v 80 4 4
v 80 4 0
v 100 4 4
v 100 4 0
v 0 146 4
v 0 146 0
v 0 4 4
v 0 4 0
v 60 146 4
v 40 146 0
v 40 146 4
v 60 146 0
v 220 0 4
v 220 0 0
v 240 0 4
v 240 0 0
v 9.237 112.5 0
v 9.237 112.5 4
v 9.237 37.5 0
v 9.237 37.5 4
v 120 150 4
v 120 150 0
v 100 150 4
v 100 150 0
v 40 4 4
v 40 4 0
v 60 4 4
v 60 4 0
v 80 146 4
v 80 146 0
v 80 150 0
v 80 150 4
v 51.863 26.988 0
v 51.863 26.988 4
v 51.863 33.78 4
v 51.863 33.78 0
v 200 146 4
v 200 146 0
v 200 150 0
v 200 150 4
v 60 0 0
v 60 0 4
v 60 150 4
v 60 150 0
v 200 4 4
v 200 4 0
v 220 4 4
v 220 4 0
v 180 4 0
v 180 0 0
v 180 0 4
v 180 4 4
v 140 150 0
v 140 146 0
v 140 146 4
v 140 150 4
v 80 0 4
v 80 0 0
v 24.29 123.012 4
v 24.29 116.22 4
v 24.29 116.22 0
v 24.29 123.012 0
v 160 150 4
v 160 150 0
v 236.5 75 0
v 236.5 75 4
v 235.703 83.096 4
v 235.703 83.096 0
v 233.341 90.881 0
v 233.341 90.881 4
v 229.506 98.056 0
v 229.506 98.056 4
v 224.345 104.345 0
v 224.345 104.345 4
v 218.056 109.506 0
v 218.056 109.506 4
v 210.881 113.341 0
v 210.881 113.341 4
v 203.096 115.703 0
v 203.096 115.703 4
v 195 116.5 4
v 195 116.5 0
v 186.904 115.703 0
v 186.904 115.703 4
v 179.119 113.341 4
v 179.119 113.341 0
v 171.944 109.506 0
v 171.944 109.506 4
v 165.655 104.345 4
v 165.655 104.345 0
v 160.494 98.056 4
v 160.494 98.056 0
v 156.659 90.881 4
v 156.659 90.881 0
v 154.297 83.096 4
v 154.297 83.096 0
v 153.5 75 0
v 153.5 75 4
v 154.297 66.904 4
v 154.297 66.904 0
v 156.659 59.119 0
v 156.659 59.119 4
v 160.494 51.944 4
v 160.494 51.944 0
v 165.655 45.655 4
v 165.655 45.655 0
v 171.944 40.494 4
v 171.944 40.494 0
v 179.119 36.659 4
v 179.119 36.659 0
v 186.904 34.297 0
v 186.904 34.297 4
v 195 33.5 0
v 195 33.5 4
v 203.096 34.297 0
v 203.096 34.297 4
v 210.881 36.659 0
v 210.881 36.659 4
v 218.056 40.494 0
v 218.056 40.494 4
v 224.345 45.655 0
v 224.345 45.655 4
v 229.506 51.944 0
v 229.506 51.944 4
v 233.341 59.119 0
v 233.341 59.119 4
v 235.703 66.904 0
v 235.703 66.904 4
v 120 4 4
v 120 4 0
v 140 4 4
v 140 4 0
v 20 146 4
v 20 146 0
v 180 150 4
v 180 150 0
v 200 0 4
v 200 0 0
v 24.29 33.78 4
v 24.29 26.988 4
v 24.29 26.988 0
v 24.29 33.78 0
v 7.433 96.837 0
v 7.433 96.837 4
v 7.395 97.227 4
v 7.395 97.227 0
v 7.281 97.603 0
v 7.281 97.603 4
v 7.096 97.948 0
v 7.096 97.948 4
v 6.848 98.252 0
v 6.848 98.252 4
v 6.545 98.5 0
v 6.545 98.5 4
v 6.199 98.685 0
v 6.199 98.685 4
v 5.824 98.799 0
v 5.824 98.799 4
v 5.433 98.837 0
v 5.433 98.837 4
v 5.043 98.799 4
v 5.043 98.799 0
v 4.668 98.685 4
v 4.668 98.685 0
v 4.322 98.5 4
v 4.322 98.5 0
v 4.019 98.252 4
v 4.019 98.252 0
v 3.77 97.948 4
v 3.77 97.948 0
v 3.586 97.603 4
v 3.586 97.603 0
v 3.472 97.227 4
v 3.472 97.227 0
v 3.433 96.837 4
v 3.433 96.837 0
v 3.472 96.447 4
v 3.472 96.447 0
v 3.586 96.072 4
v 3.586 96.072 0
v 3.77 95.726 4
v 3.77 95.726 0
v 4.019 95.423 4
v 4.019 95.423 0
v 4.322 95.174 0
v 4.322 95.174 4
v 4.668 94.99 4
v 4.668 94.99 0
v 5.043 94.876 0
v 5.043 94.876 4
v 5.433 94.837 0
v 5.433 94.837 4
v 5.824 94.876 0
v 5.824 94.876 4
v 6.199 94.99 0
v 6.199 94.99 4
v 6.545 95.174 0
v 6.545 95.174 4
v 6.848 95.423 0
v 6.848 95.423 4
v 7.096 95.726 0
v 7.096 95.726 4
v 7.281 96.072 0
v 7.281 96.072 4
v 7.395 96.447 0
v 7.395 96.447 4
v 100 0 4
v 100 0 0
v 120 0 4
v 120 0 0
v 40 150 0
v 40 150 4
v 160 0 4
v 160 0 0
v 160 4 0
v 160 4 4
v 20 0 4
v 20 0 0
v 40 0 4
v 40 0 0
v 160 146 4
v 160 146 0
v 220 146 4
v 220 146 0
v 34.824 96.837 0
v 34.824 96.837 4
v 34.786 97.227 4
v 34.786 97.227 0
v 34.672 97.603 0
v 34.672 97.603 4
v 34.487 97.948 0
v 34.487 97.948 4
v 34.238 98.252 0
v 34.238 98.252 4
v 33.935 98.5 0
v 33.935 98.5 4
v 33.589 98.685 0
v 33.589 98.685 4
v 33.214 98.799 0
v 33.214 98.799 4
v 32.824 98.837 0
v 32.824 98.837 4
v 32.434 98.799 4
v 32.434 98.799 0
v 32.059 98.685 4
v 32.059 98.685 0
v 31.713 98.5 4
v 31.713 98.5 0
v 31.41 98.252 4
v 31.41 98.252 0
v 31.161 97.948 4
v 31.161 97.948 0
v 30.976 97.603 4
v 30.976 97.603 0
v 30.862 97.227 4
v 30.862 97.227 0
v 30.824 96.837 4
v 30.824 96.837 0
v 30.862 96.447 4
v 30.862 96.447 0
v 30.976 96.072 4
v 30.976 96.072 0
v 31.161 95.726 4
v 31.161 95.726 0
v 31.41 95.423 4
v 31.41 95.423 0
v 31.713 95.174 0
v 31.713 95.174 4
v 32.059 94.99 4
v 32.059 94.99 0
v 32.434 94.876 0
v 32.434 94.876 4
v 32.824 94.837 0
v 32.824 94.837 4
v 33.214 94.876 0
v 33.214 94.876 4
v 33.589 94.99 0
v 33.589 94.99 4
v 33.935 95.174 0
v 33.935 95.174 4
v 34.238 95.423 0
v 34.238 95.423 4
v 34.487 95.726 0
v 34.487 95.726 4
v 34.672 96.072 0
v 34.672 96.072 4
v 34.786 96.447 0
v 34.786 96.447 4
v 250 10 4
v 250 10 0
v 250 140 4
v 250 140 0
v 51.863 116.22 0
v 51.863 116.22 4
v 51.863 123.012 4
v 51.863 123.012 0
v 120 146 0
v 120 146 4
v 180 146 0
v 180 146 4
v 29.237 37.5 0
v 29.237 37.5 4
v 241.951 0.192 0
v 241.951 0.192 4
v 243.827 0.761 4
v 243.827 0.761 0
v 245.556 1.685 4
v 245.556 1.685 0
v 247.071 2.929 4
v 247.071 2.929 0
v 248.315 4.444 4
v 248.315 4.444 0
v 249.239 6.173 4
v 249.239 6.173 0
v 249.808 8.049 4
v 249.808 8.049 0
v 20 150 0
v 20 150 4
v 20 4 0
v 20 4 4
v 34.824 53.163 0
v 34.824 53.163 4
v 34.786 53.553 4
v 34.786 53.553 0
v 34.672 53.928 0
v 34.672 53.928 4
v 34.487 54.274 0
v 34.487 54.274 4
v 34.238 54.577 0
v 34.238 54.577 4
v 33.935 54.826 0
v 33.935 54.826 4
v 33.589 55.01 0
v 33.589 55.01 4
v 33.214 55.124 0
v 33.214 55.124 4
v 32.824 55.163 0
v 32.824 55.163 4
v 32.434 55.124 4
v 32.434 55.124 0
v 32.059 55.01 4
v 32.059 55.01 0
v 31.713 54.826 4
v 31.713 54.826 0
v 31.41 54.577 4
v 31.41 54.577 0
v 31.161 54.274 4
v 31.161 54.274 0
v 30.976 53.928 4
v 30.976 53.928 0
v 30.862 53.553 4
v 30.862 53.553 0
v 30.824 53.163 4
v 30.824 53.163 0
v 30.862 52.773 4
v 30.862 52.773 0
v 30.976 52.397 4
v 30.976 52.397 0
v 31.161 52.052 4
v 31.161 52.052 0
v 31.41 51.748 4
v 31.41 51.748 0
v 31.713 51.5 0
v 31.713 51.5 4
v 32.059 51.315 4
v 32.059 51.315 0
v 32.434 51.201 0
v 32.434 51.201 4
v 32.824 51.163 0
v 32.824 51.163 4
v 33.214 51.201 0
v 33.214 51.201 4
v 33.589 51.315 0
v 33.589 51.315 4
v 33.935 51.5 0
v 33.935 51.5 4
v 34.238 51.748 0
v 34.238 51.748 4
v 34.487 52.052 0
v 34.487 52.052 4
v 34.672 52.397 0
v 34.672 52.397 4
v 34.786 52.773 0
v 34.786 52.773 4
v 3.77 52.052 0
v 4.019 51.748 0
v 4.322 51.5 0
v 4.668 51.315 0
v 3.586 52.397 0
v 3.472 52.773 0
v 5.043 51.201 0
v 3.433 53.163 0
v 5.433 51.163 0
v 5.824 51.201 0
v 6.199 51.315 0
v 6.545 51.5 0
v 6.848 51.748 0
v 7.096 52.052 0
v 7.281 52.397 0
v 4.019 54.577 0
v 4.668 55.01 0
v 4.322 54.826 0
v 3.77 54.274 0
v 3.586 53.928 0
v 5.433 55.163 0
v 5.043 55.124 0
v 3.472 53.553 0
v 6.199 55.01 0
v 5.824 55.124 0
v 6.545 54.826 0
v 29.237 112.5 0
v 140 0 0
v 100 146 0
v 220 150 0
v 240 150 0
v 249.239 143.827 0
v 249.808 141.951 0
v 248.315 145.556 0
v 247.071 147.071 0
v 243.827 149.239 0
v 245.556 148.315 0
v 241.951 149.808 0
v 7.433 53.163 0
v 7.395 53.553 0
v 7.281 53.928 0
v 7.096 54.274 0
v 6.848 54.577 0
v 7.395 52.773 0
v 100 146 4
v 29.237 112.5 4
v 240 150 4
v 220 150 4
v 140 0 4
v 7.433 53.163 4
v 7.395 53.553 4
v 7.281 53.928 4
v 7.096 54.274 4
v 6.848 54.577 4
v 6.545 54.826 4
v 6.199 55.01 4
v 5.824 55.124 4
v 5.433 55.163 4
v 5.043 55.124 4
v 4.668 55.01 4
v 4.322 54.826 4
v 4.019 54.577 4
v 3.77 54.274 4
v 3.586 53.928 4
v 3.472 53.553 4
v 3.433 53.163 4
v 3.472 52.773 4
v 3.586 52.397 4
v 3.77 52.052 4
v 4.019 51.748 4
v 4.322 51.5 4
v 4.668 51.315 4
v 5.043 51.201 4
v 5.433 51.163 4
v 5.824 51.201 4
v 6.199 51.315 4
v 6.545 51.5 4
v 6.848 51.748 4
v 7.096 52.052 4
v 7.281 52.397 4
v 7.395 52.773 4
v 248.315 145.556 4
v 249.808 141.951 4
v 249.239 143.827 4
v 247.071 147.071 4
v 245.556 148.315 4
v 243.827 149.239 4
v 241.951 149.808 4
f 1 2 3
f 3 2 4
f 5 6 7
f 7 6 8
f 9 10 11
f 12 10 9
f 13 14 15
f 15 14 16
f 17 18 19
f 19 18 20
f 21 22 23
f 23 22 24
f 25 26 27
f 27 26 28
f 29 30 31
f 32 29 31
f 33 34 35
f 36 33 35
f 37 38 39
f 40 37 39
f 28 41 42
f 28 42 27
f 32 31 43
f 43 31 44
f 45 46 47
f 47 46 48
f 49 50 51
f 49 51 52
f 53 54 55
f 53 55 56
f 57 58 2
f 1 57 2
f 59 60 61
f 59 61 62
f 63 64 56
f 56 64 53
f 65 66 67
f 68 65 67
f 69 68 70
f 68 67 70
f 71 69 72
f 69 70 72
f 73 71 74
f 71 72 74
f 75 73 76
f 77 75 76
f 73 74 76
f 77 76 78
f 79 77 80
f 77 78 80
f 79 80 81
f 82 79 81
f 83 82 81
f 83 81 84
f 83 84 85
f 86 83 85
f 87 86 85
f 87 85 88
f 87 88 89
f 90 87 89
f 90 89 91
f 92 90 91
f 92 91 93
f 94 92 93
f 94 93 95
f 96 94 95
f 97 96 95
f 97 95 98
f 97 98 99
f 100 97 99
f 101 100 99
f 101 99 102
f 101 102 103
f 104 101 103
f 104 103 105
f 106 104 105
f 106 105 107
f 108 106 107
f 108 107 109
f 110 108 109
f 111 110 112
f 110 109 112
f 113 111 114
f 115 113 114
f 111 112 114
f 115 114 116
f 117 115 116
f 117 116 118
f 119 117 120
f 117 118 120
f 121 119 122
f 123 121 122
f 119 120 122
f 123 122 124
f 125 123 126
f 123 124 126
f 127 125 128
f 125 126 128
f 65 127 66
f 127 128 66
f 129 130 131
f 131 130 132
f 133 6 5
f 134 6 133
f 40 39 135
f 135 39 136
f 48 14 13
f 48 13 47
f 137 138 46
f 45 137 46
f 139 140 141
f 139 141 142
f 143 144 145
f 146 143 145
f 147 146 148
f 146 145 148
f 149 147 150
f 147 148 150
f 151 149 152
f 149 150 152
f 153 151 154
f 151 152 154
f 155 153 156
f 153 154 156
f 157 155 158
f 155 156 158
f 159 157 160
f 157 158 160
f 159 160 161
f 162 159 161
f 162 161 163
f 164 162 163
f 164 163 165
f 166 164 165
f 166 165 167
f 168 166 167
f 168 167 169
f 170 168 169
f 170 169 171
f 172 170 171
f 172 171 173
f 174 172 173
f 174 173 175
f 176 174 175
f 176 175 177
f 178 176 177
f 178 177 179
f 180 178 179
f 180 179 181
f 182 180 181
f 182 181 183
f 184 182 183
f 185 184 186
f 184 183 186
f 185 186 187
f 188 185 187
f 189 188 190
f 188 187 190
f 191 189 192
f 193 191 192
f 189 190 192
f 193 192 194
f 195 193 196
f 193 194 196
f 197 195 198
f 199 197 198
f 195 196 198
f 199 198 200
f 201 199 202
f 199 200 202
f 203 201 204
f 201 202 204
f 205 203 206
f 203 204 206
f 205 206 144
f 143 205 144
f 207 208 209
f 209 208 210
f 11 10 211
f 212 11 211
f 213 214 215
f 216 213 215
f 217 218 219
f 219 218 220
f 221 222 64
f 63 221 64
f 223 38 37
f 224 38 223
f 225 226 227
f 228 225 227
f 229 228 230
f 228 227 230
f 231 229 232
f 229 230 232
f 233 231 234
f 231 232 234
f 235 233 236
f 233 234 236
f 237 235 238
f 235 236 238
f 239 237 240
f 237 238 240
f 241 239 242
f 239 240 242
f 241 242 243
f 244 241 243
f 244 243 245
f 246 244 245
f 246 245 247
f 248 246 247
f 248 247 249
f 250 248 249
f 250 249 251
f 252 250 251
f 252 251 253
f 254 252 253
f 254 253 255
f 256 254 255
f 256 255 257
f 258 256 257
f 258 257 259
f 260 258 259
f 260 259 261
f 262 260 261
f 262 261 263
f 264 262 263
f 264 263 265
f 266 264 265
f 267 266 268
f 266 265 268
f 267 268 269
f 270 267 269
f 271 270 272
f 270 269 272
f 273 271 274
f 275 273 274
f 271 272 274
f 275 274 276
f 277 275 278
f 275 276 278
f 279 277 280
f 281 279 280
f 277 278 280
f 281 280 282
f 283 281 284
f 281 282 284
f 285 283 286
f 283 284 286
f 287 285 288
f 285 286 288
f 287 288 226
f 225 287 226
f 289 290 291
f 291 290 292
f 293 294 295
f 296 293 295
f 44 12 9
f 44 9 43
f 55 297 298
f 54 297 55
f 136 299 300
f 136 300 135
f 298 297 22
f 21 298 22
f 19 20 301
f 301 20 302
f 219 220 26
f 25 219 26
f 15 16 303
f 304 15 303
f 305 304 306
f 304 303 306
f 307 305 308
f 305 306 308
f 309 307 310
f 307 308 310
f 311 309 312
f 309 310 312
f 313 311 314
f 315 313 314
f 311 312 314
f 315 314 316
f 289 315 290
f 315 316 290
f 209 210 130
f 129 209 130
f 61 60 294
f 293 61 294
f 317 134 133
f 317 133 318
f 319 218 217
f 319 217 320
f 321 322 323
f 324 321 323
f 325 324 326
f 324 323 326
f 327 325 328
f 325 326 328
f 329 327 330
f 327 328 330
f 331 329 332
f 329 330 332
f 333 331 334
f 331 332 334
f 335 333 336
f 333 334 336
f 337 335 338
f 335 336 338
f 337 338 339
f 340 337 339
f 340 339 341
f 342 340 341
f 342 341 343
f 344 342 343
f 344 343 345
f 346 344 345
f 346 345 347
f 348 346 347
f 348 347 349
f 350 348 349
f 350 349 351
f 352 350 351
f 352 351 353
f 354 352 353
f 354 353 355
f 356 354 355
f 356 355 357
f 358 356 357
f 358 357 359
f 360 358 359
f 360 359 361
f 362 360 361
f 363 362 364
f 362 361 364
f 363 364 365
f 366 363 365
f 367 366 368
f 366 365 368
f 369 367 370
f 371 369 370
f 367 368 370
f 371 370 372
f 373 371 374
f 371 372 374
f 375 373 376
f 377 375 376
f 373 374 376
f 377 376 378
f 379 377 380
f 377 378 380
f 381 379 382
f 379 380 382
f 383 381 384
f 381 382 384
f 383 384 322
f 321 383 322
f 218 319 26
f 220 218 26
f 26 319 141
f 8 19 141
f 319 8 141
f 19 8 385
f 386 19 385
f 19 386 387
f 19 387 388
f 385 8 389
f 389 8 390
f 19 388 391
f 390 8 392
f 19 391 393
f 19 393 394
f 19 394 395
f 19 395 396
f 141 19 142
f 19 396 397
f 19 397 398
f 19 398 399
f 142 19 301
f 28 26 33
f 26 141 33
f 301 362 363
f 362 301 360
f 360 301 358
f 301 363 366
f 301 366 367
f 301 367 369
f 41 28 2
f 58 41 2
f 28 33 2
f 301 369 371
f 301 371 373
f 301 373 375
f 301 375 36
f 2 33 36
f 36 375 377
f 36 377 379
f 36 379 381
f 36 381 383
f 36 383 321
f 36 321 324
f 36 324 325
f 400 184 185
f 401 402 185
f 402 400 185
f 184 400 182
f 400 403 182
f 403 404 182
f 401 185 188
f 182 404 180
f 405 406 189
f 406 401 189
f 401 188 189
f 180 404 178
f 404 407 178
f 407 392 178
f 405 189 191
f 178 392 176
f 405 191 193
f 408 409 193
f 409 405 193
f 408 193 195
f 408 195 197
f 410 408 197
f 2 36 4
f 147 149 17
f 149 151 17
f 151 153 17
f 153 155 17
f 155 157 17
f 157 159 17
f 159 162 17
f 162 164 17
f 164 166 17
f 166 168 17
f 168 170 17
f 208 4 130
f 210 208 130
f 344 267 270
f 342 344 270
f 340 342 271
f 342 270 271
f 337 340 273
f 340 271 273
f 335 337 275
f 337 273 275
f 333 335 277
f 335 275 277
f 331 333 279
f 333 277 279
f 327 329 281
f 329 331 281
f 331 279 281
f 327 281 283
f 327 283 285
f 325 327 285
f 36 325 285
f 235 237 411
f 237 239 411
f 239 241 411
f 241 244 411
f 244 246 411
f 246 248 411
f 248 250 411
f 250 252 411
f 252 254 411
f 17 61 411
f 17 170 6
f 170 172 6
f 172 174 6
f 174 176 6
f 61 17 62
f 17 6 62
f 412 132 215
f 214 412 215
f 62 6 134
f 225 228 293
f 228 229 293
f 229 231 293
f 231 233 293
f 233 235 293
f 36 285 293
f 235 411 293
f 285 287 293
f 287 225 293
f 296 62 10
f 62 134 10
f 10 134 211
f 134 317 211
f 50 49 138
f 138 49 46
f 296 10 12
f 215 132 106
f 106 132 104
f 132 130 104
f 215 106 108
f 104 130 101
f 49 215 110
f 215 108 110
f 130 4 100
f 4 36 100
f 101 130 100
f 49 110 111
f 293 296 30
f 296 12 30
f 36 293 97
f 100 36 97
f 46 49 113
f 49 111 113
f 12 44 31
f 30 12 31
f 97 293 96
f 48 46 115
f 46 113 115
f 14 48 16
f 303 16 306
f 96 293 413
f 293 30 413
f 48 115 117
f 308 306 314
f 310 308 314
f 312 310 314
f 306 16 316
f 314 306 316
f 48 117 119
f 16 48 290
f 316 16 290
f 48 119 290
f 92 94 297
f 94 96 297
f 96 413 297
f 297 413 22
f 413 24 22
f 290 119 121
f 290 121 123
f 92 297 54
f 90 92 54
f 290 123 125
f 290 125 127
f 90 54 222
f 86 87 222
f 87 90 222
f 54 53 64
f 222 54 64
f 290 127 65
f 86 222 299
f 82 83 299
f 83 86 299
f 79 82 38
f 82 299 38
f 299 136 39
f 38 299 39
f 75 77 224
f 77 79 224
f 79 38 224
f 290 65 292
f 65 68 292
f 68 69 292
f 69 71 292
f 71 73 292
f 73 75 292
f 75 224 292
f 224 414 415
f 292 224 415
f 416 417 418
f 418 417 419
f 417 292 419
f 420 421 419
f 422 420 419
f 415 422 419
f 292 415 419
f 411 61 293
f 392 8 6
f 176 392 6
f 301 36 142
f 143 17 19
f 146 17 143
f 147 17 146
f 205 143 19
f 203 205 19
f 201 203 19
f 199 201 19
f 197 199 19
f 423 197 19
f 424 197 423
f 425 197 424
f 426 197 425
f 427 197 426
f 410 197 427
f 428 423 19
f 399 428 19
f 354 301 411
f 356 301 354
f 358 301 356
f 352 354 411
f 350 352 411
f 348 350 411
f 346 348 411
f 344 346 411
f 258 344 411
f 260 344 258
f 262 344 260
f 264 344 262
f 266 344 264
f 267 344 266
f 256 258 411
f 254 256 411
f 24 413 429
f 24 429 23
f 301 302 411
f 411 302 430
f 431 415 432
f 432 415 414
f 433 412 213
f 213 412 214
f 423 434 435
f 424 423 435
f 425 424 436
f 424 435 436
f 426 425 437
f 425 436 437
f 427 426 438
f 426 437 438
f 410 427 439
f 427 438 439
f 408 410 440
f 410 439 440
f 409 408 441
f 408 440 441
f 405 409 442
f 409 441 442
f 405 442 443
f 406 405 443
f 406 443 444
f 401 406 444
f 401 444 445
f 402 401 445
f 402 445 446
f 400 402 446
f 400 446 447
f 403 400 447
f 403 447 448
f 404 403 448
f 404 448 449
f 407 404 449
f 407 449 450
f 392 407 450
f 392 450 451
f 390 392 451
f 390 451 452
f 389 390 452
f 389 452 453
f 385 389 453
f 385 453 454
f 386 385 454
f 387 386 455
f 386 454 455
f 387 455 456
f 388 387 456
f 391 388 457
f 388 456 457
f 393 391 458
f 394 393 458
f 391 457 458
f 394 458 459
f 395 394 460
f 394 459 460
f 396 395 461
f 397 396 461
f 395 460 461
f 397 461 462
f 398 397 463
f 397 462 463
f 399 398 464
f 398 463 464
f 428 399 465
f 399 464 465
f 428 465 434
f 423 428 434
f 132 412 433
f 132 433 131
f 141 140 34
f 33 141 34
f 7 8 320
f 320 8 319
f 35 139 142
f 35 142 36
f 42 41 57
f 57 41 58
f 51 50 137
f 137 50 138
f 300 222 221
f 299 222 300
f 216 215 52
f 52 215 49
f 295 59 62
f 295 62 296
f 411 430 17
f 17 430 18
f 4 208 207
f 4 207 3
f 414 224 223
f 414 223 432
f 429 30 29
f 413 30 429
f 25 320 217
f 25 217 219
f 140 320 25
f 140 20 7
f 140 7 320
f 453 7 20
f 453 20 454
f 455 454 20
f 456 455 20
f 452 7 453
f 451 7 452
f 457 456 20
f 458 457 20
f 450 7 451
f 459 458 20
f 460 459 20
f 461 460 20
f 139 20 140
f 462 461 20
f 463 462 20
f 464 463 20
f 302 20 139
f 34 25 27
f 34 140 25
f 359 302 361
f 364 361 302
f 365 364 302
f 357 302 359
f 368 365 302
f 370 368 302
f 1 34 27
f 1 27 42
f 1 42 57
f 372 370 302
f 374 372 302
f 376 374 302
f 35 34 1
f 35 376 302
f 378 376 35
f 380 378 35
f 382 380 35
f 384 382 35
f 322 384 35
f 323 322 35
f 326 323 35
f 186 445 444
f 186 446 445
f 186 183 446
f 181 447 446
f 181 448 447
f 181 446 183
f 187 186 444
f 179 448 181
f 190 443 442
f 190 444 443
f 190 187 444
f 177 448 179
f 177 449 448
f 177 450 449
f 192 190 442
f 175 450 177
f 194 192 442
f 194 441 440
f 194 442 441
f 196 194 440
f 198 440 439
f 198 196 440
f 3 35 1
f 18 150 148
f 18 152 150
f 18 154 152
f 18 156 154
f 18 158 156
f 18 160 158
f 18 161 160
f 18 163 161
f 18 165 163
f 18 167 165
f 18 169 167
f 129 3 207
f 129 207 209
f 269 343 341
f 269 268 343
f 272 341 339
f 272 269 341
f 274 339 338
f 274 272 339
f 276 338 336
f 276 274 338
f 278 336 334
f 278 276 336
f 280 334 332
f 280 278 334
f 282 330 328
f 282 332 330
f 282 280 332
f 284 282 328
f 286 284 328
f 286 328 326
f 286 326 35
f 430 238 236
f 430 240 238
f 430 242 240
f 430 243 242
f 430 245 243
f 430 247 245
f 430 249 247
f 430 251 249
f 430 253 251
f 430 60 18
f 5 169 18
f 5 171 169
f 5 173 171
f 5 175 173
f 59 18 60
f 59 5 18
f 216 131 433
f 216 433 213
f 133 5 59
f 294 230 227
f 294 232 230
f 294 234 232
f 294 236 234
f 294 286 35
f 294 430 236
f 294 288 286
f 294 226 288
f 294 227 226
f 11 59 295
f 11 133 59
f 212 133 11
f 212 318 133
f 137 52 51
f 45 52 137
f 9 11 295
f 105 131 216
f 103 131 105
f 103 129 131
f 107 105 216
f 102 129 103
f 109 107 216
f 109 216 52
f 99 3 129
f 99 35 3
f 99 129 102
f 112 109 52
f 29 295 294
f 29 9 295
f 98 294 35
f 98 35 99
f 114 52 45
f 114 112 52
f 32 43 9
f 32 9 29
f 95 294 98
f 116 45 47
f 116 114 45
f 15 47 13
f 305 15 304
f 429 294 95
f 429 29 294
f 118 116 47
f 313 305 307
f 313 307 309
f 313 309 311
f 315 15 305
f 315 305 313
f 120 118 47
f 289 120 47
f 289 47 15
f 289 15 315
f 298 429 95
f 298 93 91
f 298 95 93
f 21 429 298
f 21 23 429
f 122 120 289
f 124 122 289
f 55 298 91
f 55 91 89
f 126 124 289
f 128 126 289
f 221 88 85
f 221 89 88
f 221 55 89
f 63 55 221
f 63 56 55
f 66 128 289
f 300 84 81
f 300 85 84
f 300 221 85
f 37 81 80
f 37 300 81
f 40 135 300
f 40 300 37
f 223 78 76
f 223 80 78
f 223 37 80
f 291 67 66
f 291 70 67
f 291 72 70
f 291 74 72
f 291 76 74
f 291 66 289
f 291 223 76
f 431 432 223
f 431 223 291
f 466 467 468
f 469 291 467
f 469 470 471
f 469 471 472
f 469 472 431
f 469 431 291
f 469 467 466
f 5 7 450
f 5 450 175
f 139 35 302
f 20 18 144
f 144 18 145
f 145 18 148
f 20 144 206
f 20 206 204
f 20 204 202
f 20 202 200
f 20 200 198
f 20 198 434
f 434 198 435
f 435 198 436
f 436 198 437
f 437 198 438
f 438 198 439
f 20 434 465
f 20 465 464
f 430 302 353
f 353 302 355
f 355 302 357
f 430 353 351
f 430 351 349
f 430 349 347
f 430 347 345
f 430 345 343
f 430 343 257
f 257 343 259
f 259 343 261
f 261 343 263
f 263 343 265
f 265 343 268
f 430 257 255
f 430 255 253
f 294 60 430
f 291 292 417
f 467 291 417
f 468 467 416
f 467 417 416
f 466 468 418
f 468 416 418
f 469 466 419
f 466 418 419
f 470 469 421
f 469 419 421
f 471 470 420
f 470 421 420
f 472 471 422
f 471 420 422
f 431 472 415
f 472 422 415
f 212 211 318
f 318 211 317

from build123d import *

# Parameters (mm, degrees)
PAD001_DEPTH    = 4
SKETCH_R        = 41.5
SKETCH_R_2      = 2
SKETCH_W        = 27.573456
SKETCH_H        = 6.791874
POCKET_DEPTH    = 5
SKETCH002_W     = 20
SKETCH002_H     = 4
POCKET001_DEPTH = 5


with BuildPart() as part:
    # Sketch001 → Pad001 (new body)
    with BuildSketch(Plane.XY):
        with BuildLine():
            Line((0, 0), (240, 0))
            ThreePointArc((240, 0), (247.071068, 2.928932), (250, 10))
            Line((250, 10), (250, 140))
            ThreePointArc((250, 140), (247.071068, 147.071068), (240, 150))
            Line((240, 150), (0, 150))
            Line((0, 150), (0, 0))
        make_face()
    extrude(amount=PAD001_DEPTH)

    # Sketch (on Face8 of Pad001) → Pocket (cut)
    with BuildSketch(Plane.XY.offset(4)):
        with Locations((195, 75)):
            Circle(SKETCH_R)
        with Locations((5.433387, 53.162704)):
            Circle(SKETCH_R_2)
        with Locations((32.82399, 96.837296)):
            Circle(SKETCH_R_2)
        with Locations((32.82399, 53.162704)):
            Circle(SKETCH_R_2)
        with Locations((5.433387, 96.837296)):
            Circle(SKETCH_R_2)
        Polygon((9.23658, 112.5), (9.23658, 37.5), (29.23658, 37.5), (29.23658, 75), (29.23658, 112.5), align=None)
        with Locations((38.076655, 30.384063)):
            Rectangle(SKETCH_W, SKETCH_H)
        with Locations((38.076655, 119.615937)):
            Rectangle(SKETCH_W, SKETCH_H)
    extrude(amount=-POCKET_DEPTH, mode=Mode.SUBTRACT)

    # Sketch002 → Pocket001 (cut)
    with BuildSketch(Plane.XY):
        with Locations((10, 2)):
            Rectangle(SKETCH002_W, SKETCH002_H)
        with Locations((50, 2)):
            Rectangle(SKETCH002_W, SKETCH002_H)
        with Locations((90, 2)):
            Rectangle(SKETCH002_W, SKETCH002_H)
        with Locations((130, 2)):
            Rectangle(SKETCH002_W, SKETCH002_H)
        with Locations((170, 2)):
            Rectangle(SKETCH002_W, SKETCH002_H)
        with Locations((10, 148)):
            Rectangle(SKETCH002_W, SKETCH002_H)
        with Locations((50, 148)):
            Rectangle(SKETCH002_W, SKETCH002_H)
        with Locations((90, 148)):
            Rectangle(SKETCH002_W, SKETCH002_H)
        with Locations((130, 148)):
            Rectangle(SKETCH002_W, SKETCH002_H)
        with Locations((170, 148)):
            Rectangle(SKETCH002_W, SKETCH002_H)
        with Locations((210, 148)):
            Rectangle(SKETCH002_W, SKETCH002_H)
        with Locations((210, 2)):
            Rectangle(SKETCH002_W, SKETCH002_H)
    extrude(amount=POCKET001_DEPTH, mode=Mode.SUBTRACT)


solid = part.part
